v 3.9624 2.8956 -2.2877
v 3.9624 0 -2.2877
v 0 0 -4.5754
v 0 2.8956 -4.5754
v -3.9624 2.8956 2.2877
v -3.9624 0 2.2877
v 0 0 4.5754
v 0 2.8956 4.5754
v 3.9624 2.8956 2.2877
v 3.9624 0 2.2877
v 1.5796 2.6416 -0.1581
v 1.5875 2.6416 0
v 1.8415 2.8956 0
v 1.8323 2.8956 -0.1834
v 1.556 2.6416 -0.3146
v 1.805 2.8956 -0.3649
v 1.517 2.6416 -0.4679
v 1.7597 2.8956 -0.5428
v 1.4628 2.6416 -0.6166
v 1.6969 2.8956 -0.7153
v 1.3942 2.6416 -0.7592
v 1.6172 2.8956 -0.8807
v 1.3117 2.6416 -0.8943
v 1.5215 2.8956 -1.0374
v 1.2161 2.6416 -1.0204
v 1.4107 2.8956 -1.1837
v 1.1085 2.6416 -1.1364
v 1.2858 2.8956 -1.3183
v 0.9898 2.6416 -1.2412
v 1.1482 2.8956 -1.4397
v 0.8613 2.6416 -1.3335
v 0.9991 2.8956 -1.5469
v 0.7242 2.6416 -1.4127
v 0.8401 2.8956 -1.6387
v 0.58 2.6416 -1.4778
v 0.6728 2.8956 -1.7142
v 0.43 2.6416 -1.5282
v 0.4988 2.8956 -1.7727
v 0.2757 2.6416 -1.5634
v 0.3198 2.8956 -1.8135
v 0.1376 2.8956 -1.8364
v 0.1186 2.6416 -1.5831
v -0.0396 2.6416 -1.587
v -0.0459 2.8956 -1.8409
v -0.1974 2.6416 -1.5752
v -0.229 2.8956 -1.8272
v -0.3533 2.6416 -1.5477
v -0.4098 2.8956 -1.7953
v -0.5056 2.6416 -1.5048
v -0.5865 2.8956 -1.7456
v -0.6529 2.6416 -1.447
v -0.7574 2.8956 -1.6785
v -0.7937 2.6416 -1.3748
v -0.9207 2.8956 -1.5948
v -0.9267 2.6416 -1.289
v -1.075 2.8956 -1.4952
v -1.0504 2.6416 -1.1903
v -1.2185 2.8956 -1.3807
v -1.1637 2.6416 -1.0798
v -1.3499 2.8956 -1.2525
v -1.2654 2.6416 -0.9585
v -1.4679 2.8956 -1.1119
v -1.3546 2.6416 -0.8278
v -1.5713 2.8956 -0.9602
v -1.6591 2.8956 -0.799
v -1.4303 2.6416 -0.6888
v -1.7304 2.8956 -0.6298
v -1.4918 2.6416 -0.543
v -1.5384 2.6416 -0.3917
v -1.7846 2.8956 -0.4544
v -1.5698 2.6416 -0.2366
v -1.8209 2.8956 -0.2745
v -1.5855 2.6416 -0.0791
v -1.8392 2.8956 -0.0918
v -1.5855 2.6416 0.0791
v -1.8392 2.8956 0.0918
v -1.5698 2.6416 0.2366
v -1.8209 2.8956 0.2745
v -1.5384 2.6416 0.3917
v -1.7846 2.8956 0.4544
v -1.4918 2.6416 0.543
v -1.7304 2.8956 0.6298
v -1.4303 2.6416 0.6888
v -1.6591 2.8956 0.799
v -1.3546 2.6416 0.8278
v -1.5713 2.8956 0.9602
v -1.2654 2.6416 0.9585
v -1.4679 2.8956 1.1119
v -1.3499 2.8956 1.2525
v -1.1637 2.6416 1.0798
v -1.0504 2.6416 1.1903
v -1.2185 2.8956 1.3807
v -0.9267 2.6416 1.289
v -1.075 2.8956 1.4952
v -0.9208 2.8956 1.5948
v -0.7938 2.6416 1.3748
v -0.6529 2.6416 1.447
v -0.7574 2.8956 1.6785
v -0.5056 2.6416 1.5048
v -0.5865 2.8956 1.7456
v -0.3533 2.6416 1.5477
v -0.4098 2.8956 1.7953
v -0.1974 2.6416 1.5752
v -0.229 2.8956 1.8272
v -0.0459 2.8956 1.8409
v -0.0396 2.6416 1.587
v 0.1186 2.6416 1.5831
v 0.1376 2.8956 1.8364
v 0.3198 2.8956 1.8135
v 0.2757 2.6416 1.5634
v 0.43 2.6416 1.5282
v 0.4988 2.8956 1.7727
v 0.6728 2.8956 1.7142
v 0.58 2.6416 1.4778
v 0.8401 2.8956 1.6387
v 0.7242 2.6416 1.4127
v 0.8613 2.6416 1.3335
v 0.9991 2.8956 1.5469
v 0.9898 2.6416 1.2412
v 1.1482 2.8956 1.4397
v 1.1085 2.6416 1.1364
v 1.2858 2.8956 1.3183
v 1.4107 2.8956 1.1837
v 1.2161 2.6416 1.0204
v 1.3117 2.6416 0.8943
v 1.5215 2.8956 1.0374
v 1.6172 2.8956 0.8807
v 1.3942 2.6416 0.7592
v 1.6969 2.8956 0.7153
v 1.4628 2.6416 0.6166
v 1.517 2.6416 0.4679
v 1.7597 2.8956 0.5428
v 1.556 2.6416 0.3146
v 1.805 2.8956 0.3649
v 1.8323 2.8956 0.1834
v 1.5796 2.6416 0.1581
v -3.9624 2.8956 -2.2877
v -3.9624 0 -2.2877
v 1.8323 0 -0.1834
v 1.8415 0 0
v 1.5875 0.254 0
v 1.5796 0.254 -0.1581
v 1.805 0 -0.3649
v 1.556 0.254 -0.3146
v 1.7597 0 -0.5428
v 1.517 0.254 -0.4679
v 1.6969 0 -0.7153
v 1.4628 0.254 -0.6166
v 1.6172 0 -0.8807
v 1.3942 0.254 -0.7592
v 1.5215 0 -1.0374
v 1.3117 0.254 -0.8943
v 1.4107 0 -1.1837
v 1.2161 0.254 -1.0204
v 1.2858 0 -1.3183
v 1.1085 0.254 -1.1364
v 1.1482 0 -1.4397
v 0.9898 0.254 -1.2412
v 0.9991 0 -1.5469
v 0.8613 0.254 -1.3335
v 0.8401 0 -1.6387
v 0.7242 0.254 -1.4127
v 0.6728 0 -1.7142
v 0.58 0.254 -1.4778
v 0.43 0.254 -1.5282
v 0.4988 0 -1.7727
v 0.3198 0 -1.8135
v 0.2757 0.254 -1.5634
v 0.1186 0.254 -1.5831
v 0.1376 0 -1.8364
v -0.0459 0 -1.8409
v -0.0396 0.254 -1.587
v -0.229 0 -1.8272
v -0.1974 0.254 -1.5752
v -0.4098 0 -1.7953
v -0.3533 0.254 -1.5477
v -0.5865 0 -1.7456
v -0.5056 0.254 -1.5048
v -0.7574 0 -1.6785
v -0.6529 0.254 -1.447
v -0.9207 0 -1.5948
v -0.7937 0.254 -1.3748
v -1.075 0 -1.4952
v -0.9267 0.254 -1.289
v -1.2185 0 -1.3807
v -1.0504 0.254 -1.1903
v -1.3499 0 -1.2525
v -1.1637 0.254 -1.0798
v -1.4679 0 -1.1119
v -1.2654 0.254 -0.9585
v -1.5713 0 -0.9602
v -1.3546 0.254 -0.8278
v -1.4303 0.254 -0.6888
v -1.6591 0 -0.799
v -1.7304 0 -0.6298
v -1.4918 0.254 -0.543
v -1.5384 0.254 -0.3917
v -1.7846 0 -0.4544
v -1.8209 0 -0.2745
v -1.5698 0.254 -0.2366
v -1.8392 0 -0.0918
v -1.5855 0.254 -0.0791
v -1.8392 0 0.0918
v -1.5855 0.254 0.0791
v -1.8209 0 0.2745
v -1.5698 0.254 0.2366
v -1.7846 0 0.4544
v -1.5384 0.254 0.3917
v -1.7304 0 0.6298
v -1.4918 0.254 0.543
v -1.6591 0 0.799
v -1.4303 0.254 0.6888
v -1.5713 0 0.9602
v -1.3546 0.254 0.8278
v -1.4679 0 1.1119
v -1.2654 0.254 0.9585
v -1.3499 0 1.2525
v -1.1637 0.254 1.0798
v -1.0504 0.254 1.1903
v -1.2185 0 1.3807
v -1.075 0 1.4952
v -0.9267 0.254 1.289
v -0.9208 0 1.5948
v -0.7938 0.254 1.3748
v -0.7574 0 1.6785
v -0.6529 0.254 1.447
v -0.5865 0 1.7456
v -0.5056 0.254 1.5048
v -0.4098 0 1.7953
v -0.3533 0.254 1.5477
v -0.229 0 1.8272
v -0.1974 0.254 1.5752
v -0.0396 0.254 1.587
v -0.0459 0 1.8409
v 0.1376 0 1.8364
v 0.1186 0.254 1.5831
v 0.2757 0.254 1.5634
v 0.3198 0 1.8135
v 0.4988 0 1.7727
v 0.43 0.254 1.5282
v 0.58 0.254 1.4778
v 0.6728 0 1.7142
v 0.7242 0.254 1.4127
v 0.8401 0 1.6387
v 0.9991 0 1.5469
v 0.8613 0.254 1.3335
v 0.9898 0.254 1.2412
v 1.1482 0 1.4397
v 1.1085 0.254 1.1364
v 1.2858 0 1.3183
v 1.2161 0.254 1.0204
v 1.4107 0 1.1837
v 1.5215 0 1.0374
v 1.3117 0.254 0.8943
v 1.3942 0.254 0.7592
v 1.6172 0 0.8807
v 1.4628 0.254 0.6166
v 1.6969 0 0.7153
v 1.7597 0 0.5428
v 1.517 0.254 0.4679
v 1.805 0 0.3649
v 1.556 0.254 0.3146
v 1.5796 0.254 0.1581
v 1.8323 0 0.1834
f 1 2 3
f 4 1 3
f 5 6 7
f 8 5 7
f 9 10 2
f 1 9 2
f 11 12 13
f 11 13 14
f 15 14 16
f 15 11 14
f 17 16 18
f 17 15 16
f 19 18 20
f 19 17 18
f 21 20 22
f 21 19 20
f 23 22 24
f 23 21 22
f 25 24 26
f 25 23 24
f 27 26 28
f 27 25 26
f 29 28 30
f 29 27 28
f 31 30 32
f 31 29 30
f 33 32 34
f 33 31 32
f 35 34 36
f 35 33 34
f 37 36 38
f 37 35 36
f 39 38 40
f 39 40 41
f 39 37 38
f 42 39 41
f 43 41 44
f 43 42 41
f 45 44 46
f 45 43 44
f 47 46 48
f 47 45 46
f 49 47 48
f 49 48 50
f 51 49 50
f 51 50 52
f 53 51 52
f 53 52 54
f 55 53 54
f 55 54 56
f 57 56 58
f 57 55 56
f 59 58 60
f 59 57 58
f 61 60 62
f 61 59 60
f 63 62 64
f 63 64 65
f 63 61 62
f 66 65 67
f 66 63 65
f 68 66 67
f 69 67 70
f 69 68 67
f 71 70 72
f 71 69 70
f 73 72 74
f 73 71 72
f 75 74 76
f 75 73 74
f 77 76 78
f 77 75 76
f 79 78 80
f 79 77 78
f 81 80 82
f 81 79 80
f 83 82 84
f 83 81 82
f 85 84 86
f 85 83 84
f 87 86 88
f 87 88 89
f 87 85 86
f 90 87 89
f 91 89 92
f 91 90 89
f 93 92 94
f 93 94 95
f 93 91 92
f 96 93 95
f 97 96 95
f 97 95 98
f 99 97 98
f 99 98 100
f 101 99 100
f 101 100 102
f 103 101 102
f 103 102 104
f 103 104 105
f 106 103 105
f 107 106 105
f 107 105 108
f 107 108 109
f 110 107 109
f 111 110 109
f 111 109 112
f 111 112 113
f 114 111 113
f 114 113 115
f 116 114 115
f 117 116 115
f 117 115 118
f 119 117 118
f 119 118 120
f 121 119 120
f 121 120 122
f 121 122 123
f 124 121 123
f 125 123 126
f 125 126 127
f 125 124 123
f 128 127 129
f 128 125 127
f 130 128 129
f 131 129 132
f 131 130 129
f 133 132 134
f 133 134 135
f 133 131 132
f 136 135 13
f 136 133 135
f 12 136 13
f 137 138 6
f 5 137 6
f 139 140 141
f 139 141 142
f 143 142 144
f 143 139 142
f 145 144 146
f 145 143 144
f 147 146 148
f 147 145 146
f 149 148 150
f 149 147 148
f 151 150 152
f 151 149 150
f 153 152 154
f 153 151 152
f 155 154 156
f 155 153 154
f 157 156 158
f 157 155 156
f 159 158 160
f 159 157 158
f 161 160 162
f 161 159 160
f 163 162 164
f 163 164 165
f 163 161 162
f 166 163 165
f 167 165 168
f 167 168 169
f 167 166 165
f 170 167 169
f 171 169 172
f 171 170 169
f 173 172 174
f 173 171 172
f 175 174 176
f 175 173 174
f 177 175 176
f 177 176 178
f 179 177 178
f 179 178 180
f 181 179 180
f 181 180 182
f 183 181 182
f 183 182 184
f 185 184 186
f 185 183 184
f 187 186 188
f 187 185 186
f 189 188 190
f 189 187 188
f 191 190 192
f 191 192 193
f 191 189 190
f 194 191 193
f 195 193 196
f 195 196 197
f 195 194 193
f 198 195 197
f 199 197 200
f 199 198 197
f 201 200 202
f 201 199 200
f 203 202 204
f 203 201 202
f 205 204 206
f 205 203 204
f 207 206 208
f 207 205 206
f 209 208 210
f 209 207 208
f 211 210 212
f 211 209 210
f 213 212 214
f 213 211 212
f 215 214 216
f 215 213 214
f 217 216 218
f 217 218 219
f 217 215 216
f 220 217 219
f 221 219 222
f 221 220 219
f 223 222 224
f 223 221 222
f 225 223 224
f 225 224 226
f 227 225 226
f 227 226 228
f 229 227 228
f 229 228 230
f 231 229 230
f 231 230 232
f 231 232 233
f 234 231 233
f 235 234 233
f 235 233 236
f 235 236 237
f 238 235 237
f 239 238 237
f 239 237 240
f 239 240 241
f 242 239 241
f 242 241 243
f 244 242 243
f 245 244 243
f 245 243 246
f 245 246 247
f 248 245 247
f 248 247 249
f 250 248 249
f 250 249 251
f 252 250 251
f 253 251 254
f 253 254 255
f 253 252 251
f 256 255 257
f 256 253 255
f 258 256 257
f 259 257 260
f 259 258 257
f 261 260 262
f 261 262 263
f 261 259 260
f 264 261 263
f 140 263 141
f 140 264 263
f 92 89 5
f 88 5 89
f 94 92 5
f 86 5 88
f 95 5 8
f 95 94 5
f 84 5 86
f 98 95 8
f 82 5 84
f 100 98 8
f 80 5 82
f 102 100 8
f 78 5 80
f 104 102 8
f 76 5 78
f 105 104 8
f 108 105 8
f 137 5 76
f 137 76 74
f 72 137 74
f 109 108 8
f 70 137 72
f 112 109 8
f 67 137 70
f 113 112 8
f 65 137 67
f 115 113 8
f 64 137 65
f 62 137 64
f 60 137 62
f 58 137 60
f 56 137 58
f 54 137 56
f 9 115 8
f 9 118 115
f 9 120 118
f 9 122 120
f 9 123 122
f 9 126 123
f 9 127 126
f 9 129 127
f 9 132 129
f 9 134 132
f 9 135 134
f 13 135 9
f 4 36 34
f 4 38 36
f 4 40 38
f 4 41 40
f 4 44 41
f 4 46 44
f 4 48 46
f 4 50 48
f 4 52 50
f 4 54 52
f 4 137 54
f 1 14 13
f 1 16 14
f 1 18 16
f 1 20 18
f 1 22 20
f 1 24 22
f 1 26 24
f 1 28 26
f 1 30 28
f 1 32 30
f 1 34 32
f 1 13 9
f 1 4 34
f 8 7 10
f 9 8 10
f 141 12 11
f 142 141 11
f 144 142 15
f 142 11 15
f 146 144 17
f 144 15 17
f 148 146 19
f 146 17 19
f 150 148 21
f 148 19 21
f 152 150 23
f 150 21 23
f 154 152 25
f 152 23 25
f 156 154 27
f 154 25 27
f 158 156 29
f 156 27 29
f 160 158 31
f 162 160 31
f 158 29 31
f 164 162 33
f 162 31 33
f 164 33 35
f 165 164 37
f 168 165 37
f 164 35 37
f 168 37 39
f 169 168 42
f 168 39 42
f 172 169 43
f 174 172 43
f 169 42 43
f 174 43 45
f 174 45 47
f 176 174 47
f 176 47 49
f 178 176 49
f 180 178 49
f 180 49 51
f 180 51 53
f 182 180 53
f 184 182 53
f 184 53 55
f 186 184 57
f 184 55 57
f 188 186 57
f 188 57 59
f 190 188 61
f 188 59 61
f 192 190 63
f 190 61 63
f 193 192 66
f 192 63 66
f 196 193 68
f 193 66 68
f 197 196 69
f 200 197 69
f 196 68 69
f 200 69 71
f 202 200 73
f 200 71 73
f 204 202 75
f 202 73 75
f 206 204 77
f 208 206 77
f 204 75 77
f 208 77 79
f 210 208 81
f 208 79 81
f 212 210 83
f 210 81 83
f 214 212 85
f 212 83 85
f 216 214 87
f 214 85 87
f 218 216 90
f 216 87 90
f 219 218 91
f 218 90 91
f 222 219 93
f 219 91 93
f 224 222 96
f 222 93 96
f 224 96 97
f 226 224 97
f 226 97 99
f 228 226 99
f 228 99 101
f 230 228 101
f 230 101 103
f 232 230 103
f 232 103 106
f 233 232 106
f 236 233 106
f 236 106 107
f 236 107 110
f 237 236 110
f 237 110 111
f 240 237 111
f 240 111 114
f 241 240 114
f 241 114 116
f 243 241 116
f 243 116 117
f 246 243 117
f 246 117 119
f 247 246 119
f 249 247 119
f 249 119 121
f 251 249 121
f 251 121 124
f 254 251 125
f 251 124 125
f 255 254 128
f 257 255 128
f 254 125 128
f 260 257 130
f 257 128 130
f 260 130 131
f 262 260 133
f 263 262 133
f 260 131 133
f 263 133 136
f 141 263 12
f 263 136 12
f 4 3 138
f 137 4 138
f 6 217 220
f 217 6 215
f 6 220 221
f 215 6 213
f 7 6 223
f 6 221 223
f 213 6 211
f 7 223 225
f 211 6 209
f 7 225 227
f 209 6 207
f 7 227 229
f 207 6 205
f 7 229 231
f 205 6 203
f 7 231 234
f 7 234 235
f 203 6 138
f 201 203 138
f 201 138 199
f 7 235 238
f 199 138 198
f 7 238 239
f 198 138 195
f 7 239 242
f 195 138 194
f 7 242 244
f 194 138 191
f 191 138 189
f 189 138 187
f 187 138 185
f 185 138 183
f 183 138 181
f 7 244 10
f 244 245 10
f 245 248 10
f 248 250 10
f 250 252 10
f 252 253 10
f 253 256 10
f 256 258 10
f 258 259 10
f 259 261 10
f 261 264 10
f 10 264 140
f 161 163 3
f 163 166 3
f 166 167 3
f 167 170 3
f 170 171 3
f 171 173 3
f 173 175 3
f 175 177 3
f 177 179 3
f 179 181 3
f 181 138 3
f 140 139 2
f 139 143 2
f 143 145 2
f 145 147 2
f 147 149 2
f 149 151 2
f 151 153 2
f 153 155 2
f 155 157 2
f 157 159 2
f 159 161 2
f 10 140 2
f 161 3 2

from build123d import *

# Parameters (mm, degrees)
BOSS_EXTRUDE1_DEPTH = 2.8956
SKETCH2_R           = 1.5875
CUT_EXTRUDE1_DEPTH  = 2.8956
CHAMFER3_SIZE       = 0.254
CHAMFER4_SIZE       = 0.254


with BuildPart() as part:
    # Sketch1 → Boss-Extrude1 (new body)
    with BuildSketch(Plane(origin=(0, 0, 0), x_dir=(1, 0, 0), z_dir=(0, 1, 0))):
        Polygon((0, -4.575385413), (3.9624, -2.287692707), (3.9624, 2.287692707), (0, 4.575385413), (-3.9624, 2.287692707), (-3.9624, -2.287692707), align=None)
    extrude(amount=BOSS_EXTRUDE1_DEPTH)

    # Sketch2 → Cut-Extrude1 (cut)
    with BuildSketch(Plane(origin=(0, 2.8956, 0), x_dir=(1, 0, 0), z_dir=(0, 1, 0))):
        Circle(SKETCH2_R)
    extrude(amount=-CUT_EXTRUDE1_DEPTH, mode=Mode.SUBTRACT)

    # Chamfer3
    chamfer3_edges = [part.edges().sort_by_distance(p)[0] for p in [
        (-1.5875, 2.8956, 0),
    ]]
    chamfer(chamfer3_edges, length=CHAMFER3_SIZE)

    # Chamfer4
    chamfer4_edges = [part.edges().sort_by_distance(p)[0] for p in [
        (-1.5875, 0, 0),
    ]]
    chamfer(chamfer4_edges, length=CHAMFER4_SIZE)


solid = part.part
